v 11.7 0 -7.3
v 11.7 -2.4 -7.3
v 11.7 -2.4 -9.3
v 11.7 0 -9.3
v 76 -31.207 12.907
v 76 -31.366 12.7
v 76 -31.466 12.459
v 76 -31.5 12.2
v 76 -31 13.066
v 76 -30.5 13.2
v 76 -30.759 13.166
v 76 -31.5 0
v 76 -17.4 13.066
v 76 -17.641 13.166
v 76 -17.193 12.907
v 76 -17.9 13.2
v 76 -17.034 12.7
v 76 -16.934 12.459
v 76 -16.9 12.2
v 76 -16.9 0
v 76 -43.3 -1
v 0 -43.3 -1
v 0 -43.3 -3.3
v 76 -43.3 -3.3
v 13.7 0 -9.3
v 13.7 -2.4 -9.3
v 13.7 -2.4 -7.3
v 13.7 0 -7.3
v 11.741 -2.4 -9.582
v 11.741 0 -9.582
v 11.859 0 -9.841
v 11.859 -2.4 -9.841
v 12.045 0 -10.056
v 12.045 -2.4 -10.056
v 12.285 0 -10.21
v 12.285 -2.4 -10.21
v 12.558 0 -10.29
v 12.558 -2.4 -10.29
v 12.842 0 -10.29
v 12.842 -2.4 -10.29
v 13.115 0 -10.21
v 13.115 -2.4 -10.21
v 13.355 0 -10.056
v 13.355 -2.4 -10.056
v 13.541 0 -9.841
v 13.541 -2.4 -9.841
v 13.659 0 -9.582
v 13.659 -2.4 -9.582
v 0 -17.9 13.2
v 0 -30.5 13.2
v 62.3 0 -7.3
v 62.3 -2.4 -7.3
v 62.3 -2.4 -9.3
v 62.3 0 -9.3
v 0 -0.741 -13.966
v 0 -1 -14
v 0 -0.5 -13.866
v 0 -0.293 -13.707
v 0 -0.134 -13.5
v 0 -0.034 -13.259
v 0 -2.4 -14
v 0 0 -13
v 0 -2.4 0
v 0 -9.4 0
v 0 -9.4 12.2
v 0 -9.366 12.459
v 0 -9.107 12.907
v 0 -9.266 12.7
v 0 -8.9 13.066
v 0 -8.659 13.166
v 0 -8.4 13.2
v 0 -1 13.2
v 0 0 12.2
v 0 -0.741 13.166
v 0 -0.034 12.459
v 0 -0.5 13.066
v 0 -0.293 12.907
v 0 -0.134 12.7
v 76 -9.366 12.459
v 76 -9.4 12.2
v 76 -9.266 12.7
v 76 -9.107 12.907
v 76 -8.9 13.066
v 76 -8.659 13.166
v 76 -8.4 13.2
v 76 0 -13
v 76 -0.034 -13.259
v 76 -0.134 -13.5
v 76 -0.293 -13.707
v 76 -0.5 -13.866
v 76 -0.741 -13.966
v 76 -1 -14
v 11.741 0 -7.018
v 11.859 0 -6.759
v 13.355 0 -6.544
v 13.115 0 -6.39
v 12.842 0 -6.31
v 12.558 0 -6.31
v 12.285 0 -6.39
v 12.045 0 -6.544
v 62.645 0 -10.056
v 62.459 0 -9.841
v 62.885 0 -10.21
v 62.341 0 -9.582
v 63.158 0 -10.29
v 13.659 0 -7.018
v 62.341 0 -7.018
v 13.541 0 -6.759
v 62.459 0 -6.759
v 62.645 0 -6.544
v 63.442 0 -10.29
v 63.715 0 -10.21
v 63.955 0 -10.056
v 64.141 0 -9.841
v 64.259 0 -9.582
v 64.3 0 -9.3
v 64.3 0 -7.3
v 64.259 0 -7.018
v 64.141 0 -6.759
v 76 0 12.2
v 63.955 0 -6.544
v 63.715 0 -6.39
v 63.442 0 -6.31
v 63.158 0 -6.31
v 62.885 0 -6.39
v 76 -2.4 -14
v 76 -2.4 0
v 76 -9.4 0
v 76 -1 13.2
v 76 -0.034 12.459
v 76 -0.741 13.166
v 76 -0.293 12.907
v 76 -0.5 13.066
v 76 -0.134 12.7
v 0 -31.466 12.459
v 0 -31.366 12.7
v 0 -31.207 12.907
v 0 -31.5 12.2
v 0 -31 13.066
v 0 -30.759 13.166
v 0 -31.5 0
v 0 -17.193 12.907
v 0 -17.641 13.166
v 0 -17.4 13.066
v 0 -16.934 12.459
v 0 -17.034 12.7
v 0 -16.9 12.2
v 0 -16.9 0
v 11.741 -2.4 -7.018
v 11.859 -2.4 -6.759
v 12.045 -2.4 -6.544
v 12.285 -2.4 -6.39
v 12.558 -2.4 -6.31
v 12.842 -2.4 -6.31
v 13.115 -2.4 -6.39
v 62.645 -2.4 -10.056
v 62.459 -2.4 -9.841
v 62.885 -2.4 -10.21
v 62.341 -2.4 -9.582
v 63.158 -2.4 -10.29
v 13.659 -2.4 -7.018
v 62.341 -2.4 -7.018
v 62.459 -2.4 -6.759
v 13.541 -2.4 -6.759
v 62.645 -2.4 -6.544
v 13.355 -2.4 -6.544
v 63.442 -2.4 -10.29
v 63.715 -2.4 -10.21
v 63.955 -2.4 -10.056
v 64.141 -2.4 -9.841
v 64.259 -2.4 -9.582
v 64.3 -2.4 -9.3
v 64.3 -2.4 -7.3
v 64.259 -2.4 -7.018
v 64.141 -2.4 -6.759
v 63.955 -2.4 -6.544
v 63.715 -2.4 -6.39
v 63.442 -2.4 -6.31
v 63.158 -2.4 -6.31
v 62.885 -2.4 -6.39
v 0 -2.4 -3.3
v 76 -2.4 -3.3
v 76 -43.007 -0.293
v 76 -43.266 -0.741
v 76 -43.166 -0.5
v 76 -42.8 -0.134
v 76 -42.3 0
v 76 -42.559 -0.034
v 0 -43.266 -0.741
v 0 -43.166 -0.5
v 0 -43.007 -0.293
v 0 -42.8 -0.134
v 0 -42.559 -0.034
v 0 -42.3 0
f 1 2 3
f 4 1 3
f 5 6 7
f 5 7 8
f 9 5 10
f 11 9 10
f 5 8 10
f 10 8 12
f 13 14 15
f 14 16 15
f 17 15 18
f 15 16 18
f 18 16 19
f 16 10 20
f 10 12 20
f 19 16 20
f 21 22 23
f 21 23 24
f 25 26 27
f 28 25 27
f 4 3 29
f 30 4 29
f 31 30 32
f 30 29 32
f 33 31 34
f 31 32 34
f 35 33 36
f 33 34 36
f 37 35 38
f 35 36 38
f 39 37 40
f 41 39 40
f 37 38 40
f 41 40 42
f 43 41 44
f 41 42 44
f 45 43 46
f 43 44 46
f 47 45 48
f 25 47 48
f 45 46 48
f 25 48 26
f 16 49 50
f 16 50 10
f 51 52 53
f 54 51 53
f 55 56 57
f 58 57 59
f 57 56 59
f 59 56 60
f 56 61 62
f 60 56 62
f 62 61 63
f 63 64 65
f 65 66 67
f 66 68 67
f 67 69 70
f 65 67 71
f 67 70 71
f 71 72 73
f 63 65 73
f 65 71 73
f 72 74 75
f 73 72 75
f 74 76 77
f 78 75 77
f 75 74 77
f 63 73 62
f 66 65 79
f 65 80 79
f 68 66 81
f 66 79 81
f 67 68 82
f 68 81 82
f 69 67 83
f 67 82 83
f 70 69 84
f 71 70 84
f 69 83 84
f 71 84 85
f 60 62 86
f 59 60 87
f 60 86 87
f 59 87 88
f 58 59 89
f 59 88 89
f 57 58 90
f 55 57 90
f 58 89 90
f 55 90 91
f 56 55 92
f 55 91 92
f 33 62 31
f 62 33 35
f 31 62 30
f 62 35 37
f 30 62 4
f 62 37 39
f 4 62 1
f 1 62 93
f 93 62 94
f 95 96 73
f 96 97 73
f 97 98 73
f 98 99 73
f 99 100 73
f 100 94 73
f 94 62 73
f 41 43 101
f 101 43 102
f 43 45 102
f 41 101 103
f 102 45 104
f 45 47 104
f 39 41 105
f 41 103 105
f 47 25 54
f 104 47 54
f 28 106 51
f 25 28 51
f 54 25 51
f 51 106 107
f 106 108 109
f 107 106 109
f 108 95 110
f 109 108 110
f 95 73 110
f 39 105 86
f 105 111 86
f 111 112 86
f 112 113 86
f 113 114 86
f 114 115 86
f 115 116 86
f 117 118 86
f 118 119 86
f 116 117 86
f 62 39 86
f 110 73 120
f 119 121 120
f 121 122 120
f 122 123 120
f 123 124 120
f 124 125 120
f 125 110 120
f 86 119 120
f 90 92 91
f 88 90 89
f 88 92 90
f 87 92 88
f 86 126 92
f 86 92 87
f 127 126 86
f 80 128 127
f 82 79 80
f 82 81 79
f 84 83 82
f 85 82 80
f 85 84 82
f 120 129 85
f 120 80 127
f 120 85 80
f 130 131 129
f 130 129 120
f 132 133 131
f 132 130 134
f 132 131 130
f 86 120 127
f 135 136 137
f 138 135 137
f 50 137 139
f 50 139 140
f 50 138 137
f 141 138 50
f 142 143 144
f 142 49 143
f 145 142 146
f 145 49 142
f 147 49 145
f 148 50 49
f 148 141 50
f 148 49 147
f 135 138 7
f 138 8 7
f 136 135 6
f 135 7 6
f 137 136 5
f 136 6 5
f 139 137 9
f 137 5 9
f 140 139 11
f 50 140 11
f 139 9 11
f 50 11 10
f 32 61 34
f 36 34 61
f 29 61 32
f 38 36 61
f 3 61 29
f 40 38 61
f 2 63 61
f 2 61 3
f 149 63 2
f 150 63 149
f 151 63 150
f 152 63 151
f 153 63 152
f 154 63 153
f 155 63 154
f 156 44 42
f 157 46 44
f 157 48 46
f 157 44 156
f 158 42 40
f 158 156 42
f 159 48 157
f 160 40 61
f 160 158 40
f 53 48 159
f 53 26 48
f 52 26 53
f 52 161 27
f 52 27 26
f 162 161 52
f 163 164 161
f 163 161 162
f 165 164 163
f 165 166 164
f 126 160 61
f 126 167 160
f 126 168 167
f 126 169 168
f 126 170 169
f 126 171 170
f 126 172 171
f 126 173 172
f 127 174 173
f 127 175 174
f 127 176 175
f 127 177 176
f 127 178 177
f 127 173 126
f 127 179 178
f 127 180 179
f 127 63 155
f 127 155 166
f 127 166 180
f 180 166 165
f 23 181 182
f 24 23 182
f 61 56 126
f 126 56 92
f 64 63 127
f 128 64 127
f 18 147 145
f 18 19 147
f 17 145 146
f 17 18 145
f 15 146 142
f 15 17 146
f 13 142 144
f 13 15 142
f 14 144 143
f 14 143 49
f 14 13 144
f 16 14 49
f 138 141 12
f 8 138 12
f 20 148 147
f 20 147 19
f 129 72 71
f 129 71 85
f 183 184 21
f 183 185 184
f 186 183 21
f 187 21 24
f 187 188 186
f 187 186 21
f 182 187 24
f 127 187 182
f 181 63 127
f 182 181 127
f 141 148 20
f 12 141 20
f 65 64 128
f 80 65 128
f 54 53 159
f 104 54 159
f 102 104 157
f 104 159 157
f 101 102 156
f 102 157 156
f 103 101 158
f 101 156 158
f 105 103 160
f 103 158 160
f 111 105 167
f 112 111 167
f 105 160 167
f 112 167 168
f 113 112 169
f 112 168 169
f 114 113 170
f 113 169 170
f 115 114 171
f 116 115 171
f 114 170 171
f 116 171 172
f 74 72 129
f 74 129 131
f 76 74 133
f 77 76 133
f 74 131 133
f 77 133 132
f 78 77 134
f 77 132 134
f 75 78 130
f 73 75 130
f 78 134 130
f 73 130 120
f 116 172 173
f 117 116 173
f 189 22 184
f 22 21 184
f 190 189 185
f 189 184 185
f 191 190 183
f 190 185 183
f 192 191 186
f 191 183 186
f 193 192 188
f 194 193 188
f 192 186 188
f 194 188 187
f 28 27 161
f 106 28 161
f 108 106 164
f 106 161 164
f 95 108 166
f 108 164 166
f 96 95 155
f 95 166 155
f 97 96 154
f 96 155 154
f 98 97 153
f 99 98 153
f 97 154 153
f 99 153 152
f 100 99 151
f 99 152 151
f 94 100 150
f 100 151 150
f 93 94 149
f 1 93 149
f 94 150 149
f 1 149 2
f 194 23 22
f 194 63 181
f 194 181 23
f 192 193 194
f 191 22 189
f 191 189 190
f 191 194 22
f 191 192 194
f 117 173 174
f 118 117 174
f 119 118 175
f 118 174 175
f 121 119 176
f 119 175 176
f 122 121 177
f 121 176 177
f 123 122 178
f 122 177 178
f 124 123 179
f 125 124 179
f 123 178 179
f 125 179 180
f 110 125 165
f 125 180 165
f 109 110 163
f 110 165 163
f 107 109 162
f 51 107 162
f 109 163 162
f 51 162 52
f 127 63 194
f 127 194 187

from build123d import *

# Parameters (mm, degrees)
F0_W     = 76
F0_H     = 7
F0_H_2   = 2.4
F1_DEPTH = 13.2
F0_H_3   = 14.6
F0_H_4   = 7.5
F0_H_5   = 11.8
F2_DEPTH = 3.3
F3_DEPTH = 14
F4_R     = 1
F4_2_R   = 1
F5_R     = 1
F6_R     = 1
F8_DEPTH = 2.401


with BuildPart() as f1:
    # F0 (on Top) → F1 (new body)
    with BuildSketch(Plane.XY):
        with Locations((38, -5.9)):
            Rectangle(F0_W, F0_H)
        with Locations((38, -1.2)):
            Rectangle(F0_W, F0_H_2)
    extrude(amount=F1_DEPTH)

    # F0 (on Top) → F3 (join)
    with BuildSketch(Plane.XY):
        with Locations((38, -1.2)):
            Rectangle(F0_W, F0_H_2)
    extrude(amount=-F3_DEPTH)

    # F4
    f4_edges = [f1.edges().sort_by_distance(p)[0] for p in [
        (38, 0, 13.2),
        (38, -9.4, 13.2),
    ]]
    fillet(f4_edges, radius=F4_R)

    # F5
    f5_edges = [f1.edges().sort_by_distance(p)[0] for p in [
        (38, 0, -14),
    ]]
    fillet(f5_edges, radius=F5_R)

    # F7 (on face) → F8 (cut, through all)
    with BuildSketch(Plane.XZ.offset(2.4)):
        with BuildLine():
            ThreePointArc((11.7, -9.3), (12.7, -10.3), (13.7, -9.3))
            Line((13.7, -9.3), (13.7, -7.3))
            ThreePointArc((13.7, -7.3), (12.7, -6.3), (11.7, -7.3))
            Line((11.7, -7.3), (11.7, -9.3))
        make_face()
        with BuildLine():
            ThreePointArc((62.3, -9.3), (63.3, -10.3), (64.3, -9.3))
            Line((64.3, -9.3), (64.3, -7.3))
            ThreePointArc((64.3, -7.3), (63.3, -6.3), (62.3, -7.3))
            Line((62.3, -7.3), (62.3, -9.3))
        make_face()
    extrude(amount=-F8_DEPTH, mode=Mode.SUBTRACT)


with BuildPart() as f1b:
    # F0 (on Top) → F1, piece 2 (new body)
    with BuildSketch(Plane.XY):
        with Locations((38, -24.2)):
            Rectangle(F0_W, F0_H_3)
    extrude(amount=F1_DEPTH)

    # F4#2
    f4_2_edges = [f1b.edges().sort_by_distance(p)[0] for p in [
        (38, -16.9, 13.2),
        (38, -31.5, 13.2),
    ]]
    fillet(f4_2_edges, radius=F4_2_R)


with BuildPart() as f2:
    # F0 (on Top) → F2 (new body)
    with BuildSketch(Plane.XY):
        with Locations((38, -5.9)):
            Rectangle(F0_W, F0_H)
        with Locations((38, -13.15)):
            Rectangle(F0_W, F0_H_4)
        with Locations((38, -24.2)):
            Rectangle(F0_W, F0_H_3)
        with Locations((38, -37.4)):
            Rectangle(F0_W, F0_H_5)
    extrude(amount=-F2_DEPTH)

    # F6
    f6_edges = [f2.edges().sort_by_distance(p)[0] for p in [
        (38, -43.3, 0),
    ]]
    fillet(f6_edges, radius=F6_R)


solid = Compound([f1.part, f1b.part, f2.part])
